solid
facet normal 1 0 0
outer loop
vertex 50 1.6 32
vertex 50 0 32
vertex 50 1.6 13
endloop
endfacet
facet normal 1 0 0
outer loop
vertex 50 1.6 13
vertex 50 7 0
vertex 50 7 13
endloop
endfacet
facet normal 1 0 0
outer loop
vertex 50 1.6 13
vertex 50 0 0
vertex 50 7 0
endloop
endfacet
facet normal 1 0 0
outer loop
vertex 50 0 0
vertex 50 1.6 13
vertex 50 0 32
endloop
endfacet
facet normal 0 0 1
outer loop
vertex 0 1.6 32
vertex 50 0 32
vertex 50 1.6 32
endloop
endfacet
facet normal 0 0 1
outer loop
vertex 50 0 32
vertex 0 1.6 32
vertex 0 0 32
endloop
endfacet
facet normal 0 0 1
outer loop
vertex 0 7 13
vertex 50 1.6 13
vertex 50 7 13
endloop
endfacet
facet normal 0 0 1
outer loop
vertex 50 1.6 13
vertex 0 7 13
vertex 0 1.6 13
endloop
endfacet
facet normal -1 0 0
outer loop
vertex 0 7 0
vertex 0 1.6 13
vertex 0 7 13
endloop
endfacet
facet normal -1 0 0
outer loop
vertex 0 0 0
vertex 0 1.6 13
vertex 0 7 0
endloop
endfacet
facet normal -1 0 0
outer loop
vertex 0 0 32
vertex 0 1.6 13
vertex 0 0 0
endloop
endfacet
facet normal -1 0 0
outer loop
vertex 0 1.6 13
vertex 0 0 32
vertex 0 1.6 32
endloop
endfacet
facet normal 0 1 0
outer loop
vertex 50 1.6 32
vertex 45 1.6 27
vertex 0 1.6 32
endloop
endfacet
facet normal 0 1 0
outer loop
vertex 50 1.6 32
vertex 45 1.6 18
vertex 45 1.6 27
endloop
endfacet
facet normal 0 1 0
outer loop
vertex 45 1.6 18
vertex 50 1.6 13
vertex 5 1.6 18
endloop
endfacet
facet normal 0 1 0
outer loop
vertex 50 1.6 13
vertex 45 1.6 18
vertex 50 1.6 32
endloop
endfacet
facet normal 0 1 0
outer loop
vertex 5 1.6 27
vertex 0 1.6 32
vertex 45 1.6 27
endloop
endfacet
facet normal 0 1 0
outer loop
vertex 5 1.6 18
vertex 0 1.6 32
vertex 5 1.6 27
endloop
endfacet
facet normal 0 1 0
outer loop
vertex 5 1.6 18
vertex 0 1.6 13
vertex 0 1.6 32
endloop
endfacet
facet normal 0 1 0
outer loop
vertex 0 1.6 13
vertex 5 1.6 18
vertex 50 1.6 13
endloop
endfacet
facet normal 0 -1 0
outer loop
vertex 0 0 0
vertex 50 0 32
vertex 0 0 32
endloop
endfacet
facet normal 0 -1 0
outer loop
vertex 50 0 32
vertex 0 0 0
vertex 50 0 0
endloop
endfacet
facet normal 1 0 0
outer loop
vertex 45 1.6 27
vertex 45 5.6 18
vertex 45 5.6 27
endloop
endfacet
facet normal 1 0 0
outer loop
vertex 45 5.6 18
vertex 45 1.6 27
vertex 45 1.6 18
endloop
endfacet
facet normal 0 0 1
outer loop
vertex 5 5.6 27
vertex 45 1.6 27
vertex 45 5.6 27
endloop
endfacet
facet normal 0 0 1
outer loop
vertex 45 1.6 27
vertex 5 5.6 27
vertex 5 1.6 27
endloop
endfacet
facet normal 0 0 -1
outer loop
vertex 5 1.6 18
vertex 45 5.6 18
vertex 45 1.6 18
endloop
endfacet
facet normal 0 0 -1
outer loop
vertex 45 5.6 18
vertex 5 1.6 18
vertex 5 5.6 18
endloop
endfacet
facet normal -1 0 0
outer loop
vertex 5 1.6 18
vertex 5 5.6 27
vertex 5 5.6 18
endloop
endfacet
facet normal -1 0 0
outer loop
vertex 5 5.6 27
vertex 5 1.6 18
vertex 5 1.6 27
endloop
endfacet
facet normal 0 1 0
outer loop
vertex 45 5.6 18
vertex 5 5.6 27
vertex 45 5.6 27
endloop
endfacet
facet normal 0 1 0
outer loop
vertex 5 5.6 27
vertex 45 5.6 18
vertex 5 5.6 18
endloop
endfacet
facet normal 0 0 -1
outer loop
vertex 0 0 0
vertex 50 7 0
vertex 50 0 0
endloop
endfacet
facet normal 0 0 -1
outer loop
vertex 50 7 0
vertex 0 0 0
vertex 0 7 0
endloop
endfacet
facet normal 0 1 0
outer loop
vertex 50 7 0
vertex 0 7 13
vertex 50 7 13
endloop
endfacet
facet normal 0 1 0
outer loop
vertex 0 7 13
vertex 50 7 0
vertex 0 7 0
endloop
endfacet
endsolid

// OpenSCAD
// Pico ATX Power Supply
// Ultra-compact DC-DC converter that plugs directly into motherboard ATX header
// Models only the male connector and PSU PCB (no cable or barrel jack)
// Requires external AC-DC adapter with separate barrel jack cable

module psu_pico() {
    // Male ATX 24-pin connector dimensions (plugs into motherboard)
    atx_male_width = 50;      // Width of 24-pin connector (X axis, left-right)
    atx_male_depth = 7;    // Depth of connector (Y axis, front-back)
    atx_male_height = 13;     // Height of connector (Z axis, up-down)

    // Pico PSU PCB dimensions (extends upward from connector)
    pico_pcb_length = 50;      // Length along X axis (longest side, left-right)
    pico_pcb_height = 19;      // Height along Z axis (extends upward)
    pico_pcb_thickness = 1.6;  // Thickness along Y axis
    pico_component_depth = 4;  // Component protrusion from PCB face

    // Center PCB on connector
    pcb_x_offset = (atx_male_width - pico_pcb_length) / 2;

    union() {
        // Male ATX 24-pin connector (yellow/gold) - faces down
        color("yellow") {
            cube([atx_male_width, atx_male_depth, atx_male_height]);
        }

        // PCB Assembly (PCB + components grouped together)
        translate([pcb_x_offset, 0, atx_male_height]) {
            // Pico PSU PCB (extends upward, longest side along X)
            color("green") {
                cube([pico_pcb_length, pico_pcb_thickness, pico_pcb_height]);
            }

            // Components on PCB face (protrude in +Y direction)
            color([0.2, 0.2, 0.2]) {
                translate([5, pico_pcb_thickness, 5]) {
                    cube([pico_pcb_length - 10, pico_component_depth, pico_pcb_height - 10]);
                }
            }
        }
    }
}

// Preview
psu_pico();
